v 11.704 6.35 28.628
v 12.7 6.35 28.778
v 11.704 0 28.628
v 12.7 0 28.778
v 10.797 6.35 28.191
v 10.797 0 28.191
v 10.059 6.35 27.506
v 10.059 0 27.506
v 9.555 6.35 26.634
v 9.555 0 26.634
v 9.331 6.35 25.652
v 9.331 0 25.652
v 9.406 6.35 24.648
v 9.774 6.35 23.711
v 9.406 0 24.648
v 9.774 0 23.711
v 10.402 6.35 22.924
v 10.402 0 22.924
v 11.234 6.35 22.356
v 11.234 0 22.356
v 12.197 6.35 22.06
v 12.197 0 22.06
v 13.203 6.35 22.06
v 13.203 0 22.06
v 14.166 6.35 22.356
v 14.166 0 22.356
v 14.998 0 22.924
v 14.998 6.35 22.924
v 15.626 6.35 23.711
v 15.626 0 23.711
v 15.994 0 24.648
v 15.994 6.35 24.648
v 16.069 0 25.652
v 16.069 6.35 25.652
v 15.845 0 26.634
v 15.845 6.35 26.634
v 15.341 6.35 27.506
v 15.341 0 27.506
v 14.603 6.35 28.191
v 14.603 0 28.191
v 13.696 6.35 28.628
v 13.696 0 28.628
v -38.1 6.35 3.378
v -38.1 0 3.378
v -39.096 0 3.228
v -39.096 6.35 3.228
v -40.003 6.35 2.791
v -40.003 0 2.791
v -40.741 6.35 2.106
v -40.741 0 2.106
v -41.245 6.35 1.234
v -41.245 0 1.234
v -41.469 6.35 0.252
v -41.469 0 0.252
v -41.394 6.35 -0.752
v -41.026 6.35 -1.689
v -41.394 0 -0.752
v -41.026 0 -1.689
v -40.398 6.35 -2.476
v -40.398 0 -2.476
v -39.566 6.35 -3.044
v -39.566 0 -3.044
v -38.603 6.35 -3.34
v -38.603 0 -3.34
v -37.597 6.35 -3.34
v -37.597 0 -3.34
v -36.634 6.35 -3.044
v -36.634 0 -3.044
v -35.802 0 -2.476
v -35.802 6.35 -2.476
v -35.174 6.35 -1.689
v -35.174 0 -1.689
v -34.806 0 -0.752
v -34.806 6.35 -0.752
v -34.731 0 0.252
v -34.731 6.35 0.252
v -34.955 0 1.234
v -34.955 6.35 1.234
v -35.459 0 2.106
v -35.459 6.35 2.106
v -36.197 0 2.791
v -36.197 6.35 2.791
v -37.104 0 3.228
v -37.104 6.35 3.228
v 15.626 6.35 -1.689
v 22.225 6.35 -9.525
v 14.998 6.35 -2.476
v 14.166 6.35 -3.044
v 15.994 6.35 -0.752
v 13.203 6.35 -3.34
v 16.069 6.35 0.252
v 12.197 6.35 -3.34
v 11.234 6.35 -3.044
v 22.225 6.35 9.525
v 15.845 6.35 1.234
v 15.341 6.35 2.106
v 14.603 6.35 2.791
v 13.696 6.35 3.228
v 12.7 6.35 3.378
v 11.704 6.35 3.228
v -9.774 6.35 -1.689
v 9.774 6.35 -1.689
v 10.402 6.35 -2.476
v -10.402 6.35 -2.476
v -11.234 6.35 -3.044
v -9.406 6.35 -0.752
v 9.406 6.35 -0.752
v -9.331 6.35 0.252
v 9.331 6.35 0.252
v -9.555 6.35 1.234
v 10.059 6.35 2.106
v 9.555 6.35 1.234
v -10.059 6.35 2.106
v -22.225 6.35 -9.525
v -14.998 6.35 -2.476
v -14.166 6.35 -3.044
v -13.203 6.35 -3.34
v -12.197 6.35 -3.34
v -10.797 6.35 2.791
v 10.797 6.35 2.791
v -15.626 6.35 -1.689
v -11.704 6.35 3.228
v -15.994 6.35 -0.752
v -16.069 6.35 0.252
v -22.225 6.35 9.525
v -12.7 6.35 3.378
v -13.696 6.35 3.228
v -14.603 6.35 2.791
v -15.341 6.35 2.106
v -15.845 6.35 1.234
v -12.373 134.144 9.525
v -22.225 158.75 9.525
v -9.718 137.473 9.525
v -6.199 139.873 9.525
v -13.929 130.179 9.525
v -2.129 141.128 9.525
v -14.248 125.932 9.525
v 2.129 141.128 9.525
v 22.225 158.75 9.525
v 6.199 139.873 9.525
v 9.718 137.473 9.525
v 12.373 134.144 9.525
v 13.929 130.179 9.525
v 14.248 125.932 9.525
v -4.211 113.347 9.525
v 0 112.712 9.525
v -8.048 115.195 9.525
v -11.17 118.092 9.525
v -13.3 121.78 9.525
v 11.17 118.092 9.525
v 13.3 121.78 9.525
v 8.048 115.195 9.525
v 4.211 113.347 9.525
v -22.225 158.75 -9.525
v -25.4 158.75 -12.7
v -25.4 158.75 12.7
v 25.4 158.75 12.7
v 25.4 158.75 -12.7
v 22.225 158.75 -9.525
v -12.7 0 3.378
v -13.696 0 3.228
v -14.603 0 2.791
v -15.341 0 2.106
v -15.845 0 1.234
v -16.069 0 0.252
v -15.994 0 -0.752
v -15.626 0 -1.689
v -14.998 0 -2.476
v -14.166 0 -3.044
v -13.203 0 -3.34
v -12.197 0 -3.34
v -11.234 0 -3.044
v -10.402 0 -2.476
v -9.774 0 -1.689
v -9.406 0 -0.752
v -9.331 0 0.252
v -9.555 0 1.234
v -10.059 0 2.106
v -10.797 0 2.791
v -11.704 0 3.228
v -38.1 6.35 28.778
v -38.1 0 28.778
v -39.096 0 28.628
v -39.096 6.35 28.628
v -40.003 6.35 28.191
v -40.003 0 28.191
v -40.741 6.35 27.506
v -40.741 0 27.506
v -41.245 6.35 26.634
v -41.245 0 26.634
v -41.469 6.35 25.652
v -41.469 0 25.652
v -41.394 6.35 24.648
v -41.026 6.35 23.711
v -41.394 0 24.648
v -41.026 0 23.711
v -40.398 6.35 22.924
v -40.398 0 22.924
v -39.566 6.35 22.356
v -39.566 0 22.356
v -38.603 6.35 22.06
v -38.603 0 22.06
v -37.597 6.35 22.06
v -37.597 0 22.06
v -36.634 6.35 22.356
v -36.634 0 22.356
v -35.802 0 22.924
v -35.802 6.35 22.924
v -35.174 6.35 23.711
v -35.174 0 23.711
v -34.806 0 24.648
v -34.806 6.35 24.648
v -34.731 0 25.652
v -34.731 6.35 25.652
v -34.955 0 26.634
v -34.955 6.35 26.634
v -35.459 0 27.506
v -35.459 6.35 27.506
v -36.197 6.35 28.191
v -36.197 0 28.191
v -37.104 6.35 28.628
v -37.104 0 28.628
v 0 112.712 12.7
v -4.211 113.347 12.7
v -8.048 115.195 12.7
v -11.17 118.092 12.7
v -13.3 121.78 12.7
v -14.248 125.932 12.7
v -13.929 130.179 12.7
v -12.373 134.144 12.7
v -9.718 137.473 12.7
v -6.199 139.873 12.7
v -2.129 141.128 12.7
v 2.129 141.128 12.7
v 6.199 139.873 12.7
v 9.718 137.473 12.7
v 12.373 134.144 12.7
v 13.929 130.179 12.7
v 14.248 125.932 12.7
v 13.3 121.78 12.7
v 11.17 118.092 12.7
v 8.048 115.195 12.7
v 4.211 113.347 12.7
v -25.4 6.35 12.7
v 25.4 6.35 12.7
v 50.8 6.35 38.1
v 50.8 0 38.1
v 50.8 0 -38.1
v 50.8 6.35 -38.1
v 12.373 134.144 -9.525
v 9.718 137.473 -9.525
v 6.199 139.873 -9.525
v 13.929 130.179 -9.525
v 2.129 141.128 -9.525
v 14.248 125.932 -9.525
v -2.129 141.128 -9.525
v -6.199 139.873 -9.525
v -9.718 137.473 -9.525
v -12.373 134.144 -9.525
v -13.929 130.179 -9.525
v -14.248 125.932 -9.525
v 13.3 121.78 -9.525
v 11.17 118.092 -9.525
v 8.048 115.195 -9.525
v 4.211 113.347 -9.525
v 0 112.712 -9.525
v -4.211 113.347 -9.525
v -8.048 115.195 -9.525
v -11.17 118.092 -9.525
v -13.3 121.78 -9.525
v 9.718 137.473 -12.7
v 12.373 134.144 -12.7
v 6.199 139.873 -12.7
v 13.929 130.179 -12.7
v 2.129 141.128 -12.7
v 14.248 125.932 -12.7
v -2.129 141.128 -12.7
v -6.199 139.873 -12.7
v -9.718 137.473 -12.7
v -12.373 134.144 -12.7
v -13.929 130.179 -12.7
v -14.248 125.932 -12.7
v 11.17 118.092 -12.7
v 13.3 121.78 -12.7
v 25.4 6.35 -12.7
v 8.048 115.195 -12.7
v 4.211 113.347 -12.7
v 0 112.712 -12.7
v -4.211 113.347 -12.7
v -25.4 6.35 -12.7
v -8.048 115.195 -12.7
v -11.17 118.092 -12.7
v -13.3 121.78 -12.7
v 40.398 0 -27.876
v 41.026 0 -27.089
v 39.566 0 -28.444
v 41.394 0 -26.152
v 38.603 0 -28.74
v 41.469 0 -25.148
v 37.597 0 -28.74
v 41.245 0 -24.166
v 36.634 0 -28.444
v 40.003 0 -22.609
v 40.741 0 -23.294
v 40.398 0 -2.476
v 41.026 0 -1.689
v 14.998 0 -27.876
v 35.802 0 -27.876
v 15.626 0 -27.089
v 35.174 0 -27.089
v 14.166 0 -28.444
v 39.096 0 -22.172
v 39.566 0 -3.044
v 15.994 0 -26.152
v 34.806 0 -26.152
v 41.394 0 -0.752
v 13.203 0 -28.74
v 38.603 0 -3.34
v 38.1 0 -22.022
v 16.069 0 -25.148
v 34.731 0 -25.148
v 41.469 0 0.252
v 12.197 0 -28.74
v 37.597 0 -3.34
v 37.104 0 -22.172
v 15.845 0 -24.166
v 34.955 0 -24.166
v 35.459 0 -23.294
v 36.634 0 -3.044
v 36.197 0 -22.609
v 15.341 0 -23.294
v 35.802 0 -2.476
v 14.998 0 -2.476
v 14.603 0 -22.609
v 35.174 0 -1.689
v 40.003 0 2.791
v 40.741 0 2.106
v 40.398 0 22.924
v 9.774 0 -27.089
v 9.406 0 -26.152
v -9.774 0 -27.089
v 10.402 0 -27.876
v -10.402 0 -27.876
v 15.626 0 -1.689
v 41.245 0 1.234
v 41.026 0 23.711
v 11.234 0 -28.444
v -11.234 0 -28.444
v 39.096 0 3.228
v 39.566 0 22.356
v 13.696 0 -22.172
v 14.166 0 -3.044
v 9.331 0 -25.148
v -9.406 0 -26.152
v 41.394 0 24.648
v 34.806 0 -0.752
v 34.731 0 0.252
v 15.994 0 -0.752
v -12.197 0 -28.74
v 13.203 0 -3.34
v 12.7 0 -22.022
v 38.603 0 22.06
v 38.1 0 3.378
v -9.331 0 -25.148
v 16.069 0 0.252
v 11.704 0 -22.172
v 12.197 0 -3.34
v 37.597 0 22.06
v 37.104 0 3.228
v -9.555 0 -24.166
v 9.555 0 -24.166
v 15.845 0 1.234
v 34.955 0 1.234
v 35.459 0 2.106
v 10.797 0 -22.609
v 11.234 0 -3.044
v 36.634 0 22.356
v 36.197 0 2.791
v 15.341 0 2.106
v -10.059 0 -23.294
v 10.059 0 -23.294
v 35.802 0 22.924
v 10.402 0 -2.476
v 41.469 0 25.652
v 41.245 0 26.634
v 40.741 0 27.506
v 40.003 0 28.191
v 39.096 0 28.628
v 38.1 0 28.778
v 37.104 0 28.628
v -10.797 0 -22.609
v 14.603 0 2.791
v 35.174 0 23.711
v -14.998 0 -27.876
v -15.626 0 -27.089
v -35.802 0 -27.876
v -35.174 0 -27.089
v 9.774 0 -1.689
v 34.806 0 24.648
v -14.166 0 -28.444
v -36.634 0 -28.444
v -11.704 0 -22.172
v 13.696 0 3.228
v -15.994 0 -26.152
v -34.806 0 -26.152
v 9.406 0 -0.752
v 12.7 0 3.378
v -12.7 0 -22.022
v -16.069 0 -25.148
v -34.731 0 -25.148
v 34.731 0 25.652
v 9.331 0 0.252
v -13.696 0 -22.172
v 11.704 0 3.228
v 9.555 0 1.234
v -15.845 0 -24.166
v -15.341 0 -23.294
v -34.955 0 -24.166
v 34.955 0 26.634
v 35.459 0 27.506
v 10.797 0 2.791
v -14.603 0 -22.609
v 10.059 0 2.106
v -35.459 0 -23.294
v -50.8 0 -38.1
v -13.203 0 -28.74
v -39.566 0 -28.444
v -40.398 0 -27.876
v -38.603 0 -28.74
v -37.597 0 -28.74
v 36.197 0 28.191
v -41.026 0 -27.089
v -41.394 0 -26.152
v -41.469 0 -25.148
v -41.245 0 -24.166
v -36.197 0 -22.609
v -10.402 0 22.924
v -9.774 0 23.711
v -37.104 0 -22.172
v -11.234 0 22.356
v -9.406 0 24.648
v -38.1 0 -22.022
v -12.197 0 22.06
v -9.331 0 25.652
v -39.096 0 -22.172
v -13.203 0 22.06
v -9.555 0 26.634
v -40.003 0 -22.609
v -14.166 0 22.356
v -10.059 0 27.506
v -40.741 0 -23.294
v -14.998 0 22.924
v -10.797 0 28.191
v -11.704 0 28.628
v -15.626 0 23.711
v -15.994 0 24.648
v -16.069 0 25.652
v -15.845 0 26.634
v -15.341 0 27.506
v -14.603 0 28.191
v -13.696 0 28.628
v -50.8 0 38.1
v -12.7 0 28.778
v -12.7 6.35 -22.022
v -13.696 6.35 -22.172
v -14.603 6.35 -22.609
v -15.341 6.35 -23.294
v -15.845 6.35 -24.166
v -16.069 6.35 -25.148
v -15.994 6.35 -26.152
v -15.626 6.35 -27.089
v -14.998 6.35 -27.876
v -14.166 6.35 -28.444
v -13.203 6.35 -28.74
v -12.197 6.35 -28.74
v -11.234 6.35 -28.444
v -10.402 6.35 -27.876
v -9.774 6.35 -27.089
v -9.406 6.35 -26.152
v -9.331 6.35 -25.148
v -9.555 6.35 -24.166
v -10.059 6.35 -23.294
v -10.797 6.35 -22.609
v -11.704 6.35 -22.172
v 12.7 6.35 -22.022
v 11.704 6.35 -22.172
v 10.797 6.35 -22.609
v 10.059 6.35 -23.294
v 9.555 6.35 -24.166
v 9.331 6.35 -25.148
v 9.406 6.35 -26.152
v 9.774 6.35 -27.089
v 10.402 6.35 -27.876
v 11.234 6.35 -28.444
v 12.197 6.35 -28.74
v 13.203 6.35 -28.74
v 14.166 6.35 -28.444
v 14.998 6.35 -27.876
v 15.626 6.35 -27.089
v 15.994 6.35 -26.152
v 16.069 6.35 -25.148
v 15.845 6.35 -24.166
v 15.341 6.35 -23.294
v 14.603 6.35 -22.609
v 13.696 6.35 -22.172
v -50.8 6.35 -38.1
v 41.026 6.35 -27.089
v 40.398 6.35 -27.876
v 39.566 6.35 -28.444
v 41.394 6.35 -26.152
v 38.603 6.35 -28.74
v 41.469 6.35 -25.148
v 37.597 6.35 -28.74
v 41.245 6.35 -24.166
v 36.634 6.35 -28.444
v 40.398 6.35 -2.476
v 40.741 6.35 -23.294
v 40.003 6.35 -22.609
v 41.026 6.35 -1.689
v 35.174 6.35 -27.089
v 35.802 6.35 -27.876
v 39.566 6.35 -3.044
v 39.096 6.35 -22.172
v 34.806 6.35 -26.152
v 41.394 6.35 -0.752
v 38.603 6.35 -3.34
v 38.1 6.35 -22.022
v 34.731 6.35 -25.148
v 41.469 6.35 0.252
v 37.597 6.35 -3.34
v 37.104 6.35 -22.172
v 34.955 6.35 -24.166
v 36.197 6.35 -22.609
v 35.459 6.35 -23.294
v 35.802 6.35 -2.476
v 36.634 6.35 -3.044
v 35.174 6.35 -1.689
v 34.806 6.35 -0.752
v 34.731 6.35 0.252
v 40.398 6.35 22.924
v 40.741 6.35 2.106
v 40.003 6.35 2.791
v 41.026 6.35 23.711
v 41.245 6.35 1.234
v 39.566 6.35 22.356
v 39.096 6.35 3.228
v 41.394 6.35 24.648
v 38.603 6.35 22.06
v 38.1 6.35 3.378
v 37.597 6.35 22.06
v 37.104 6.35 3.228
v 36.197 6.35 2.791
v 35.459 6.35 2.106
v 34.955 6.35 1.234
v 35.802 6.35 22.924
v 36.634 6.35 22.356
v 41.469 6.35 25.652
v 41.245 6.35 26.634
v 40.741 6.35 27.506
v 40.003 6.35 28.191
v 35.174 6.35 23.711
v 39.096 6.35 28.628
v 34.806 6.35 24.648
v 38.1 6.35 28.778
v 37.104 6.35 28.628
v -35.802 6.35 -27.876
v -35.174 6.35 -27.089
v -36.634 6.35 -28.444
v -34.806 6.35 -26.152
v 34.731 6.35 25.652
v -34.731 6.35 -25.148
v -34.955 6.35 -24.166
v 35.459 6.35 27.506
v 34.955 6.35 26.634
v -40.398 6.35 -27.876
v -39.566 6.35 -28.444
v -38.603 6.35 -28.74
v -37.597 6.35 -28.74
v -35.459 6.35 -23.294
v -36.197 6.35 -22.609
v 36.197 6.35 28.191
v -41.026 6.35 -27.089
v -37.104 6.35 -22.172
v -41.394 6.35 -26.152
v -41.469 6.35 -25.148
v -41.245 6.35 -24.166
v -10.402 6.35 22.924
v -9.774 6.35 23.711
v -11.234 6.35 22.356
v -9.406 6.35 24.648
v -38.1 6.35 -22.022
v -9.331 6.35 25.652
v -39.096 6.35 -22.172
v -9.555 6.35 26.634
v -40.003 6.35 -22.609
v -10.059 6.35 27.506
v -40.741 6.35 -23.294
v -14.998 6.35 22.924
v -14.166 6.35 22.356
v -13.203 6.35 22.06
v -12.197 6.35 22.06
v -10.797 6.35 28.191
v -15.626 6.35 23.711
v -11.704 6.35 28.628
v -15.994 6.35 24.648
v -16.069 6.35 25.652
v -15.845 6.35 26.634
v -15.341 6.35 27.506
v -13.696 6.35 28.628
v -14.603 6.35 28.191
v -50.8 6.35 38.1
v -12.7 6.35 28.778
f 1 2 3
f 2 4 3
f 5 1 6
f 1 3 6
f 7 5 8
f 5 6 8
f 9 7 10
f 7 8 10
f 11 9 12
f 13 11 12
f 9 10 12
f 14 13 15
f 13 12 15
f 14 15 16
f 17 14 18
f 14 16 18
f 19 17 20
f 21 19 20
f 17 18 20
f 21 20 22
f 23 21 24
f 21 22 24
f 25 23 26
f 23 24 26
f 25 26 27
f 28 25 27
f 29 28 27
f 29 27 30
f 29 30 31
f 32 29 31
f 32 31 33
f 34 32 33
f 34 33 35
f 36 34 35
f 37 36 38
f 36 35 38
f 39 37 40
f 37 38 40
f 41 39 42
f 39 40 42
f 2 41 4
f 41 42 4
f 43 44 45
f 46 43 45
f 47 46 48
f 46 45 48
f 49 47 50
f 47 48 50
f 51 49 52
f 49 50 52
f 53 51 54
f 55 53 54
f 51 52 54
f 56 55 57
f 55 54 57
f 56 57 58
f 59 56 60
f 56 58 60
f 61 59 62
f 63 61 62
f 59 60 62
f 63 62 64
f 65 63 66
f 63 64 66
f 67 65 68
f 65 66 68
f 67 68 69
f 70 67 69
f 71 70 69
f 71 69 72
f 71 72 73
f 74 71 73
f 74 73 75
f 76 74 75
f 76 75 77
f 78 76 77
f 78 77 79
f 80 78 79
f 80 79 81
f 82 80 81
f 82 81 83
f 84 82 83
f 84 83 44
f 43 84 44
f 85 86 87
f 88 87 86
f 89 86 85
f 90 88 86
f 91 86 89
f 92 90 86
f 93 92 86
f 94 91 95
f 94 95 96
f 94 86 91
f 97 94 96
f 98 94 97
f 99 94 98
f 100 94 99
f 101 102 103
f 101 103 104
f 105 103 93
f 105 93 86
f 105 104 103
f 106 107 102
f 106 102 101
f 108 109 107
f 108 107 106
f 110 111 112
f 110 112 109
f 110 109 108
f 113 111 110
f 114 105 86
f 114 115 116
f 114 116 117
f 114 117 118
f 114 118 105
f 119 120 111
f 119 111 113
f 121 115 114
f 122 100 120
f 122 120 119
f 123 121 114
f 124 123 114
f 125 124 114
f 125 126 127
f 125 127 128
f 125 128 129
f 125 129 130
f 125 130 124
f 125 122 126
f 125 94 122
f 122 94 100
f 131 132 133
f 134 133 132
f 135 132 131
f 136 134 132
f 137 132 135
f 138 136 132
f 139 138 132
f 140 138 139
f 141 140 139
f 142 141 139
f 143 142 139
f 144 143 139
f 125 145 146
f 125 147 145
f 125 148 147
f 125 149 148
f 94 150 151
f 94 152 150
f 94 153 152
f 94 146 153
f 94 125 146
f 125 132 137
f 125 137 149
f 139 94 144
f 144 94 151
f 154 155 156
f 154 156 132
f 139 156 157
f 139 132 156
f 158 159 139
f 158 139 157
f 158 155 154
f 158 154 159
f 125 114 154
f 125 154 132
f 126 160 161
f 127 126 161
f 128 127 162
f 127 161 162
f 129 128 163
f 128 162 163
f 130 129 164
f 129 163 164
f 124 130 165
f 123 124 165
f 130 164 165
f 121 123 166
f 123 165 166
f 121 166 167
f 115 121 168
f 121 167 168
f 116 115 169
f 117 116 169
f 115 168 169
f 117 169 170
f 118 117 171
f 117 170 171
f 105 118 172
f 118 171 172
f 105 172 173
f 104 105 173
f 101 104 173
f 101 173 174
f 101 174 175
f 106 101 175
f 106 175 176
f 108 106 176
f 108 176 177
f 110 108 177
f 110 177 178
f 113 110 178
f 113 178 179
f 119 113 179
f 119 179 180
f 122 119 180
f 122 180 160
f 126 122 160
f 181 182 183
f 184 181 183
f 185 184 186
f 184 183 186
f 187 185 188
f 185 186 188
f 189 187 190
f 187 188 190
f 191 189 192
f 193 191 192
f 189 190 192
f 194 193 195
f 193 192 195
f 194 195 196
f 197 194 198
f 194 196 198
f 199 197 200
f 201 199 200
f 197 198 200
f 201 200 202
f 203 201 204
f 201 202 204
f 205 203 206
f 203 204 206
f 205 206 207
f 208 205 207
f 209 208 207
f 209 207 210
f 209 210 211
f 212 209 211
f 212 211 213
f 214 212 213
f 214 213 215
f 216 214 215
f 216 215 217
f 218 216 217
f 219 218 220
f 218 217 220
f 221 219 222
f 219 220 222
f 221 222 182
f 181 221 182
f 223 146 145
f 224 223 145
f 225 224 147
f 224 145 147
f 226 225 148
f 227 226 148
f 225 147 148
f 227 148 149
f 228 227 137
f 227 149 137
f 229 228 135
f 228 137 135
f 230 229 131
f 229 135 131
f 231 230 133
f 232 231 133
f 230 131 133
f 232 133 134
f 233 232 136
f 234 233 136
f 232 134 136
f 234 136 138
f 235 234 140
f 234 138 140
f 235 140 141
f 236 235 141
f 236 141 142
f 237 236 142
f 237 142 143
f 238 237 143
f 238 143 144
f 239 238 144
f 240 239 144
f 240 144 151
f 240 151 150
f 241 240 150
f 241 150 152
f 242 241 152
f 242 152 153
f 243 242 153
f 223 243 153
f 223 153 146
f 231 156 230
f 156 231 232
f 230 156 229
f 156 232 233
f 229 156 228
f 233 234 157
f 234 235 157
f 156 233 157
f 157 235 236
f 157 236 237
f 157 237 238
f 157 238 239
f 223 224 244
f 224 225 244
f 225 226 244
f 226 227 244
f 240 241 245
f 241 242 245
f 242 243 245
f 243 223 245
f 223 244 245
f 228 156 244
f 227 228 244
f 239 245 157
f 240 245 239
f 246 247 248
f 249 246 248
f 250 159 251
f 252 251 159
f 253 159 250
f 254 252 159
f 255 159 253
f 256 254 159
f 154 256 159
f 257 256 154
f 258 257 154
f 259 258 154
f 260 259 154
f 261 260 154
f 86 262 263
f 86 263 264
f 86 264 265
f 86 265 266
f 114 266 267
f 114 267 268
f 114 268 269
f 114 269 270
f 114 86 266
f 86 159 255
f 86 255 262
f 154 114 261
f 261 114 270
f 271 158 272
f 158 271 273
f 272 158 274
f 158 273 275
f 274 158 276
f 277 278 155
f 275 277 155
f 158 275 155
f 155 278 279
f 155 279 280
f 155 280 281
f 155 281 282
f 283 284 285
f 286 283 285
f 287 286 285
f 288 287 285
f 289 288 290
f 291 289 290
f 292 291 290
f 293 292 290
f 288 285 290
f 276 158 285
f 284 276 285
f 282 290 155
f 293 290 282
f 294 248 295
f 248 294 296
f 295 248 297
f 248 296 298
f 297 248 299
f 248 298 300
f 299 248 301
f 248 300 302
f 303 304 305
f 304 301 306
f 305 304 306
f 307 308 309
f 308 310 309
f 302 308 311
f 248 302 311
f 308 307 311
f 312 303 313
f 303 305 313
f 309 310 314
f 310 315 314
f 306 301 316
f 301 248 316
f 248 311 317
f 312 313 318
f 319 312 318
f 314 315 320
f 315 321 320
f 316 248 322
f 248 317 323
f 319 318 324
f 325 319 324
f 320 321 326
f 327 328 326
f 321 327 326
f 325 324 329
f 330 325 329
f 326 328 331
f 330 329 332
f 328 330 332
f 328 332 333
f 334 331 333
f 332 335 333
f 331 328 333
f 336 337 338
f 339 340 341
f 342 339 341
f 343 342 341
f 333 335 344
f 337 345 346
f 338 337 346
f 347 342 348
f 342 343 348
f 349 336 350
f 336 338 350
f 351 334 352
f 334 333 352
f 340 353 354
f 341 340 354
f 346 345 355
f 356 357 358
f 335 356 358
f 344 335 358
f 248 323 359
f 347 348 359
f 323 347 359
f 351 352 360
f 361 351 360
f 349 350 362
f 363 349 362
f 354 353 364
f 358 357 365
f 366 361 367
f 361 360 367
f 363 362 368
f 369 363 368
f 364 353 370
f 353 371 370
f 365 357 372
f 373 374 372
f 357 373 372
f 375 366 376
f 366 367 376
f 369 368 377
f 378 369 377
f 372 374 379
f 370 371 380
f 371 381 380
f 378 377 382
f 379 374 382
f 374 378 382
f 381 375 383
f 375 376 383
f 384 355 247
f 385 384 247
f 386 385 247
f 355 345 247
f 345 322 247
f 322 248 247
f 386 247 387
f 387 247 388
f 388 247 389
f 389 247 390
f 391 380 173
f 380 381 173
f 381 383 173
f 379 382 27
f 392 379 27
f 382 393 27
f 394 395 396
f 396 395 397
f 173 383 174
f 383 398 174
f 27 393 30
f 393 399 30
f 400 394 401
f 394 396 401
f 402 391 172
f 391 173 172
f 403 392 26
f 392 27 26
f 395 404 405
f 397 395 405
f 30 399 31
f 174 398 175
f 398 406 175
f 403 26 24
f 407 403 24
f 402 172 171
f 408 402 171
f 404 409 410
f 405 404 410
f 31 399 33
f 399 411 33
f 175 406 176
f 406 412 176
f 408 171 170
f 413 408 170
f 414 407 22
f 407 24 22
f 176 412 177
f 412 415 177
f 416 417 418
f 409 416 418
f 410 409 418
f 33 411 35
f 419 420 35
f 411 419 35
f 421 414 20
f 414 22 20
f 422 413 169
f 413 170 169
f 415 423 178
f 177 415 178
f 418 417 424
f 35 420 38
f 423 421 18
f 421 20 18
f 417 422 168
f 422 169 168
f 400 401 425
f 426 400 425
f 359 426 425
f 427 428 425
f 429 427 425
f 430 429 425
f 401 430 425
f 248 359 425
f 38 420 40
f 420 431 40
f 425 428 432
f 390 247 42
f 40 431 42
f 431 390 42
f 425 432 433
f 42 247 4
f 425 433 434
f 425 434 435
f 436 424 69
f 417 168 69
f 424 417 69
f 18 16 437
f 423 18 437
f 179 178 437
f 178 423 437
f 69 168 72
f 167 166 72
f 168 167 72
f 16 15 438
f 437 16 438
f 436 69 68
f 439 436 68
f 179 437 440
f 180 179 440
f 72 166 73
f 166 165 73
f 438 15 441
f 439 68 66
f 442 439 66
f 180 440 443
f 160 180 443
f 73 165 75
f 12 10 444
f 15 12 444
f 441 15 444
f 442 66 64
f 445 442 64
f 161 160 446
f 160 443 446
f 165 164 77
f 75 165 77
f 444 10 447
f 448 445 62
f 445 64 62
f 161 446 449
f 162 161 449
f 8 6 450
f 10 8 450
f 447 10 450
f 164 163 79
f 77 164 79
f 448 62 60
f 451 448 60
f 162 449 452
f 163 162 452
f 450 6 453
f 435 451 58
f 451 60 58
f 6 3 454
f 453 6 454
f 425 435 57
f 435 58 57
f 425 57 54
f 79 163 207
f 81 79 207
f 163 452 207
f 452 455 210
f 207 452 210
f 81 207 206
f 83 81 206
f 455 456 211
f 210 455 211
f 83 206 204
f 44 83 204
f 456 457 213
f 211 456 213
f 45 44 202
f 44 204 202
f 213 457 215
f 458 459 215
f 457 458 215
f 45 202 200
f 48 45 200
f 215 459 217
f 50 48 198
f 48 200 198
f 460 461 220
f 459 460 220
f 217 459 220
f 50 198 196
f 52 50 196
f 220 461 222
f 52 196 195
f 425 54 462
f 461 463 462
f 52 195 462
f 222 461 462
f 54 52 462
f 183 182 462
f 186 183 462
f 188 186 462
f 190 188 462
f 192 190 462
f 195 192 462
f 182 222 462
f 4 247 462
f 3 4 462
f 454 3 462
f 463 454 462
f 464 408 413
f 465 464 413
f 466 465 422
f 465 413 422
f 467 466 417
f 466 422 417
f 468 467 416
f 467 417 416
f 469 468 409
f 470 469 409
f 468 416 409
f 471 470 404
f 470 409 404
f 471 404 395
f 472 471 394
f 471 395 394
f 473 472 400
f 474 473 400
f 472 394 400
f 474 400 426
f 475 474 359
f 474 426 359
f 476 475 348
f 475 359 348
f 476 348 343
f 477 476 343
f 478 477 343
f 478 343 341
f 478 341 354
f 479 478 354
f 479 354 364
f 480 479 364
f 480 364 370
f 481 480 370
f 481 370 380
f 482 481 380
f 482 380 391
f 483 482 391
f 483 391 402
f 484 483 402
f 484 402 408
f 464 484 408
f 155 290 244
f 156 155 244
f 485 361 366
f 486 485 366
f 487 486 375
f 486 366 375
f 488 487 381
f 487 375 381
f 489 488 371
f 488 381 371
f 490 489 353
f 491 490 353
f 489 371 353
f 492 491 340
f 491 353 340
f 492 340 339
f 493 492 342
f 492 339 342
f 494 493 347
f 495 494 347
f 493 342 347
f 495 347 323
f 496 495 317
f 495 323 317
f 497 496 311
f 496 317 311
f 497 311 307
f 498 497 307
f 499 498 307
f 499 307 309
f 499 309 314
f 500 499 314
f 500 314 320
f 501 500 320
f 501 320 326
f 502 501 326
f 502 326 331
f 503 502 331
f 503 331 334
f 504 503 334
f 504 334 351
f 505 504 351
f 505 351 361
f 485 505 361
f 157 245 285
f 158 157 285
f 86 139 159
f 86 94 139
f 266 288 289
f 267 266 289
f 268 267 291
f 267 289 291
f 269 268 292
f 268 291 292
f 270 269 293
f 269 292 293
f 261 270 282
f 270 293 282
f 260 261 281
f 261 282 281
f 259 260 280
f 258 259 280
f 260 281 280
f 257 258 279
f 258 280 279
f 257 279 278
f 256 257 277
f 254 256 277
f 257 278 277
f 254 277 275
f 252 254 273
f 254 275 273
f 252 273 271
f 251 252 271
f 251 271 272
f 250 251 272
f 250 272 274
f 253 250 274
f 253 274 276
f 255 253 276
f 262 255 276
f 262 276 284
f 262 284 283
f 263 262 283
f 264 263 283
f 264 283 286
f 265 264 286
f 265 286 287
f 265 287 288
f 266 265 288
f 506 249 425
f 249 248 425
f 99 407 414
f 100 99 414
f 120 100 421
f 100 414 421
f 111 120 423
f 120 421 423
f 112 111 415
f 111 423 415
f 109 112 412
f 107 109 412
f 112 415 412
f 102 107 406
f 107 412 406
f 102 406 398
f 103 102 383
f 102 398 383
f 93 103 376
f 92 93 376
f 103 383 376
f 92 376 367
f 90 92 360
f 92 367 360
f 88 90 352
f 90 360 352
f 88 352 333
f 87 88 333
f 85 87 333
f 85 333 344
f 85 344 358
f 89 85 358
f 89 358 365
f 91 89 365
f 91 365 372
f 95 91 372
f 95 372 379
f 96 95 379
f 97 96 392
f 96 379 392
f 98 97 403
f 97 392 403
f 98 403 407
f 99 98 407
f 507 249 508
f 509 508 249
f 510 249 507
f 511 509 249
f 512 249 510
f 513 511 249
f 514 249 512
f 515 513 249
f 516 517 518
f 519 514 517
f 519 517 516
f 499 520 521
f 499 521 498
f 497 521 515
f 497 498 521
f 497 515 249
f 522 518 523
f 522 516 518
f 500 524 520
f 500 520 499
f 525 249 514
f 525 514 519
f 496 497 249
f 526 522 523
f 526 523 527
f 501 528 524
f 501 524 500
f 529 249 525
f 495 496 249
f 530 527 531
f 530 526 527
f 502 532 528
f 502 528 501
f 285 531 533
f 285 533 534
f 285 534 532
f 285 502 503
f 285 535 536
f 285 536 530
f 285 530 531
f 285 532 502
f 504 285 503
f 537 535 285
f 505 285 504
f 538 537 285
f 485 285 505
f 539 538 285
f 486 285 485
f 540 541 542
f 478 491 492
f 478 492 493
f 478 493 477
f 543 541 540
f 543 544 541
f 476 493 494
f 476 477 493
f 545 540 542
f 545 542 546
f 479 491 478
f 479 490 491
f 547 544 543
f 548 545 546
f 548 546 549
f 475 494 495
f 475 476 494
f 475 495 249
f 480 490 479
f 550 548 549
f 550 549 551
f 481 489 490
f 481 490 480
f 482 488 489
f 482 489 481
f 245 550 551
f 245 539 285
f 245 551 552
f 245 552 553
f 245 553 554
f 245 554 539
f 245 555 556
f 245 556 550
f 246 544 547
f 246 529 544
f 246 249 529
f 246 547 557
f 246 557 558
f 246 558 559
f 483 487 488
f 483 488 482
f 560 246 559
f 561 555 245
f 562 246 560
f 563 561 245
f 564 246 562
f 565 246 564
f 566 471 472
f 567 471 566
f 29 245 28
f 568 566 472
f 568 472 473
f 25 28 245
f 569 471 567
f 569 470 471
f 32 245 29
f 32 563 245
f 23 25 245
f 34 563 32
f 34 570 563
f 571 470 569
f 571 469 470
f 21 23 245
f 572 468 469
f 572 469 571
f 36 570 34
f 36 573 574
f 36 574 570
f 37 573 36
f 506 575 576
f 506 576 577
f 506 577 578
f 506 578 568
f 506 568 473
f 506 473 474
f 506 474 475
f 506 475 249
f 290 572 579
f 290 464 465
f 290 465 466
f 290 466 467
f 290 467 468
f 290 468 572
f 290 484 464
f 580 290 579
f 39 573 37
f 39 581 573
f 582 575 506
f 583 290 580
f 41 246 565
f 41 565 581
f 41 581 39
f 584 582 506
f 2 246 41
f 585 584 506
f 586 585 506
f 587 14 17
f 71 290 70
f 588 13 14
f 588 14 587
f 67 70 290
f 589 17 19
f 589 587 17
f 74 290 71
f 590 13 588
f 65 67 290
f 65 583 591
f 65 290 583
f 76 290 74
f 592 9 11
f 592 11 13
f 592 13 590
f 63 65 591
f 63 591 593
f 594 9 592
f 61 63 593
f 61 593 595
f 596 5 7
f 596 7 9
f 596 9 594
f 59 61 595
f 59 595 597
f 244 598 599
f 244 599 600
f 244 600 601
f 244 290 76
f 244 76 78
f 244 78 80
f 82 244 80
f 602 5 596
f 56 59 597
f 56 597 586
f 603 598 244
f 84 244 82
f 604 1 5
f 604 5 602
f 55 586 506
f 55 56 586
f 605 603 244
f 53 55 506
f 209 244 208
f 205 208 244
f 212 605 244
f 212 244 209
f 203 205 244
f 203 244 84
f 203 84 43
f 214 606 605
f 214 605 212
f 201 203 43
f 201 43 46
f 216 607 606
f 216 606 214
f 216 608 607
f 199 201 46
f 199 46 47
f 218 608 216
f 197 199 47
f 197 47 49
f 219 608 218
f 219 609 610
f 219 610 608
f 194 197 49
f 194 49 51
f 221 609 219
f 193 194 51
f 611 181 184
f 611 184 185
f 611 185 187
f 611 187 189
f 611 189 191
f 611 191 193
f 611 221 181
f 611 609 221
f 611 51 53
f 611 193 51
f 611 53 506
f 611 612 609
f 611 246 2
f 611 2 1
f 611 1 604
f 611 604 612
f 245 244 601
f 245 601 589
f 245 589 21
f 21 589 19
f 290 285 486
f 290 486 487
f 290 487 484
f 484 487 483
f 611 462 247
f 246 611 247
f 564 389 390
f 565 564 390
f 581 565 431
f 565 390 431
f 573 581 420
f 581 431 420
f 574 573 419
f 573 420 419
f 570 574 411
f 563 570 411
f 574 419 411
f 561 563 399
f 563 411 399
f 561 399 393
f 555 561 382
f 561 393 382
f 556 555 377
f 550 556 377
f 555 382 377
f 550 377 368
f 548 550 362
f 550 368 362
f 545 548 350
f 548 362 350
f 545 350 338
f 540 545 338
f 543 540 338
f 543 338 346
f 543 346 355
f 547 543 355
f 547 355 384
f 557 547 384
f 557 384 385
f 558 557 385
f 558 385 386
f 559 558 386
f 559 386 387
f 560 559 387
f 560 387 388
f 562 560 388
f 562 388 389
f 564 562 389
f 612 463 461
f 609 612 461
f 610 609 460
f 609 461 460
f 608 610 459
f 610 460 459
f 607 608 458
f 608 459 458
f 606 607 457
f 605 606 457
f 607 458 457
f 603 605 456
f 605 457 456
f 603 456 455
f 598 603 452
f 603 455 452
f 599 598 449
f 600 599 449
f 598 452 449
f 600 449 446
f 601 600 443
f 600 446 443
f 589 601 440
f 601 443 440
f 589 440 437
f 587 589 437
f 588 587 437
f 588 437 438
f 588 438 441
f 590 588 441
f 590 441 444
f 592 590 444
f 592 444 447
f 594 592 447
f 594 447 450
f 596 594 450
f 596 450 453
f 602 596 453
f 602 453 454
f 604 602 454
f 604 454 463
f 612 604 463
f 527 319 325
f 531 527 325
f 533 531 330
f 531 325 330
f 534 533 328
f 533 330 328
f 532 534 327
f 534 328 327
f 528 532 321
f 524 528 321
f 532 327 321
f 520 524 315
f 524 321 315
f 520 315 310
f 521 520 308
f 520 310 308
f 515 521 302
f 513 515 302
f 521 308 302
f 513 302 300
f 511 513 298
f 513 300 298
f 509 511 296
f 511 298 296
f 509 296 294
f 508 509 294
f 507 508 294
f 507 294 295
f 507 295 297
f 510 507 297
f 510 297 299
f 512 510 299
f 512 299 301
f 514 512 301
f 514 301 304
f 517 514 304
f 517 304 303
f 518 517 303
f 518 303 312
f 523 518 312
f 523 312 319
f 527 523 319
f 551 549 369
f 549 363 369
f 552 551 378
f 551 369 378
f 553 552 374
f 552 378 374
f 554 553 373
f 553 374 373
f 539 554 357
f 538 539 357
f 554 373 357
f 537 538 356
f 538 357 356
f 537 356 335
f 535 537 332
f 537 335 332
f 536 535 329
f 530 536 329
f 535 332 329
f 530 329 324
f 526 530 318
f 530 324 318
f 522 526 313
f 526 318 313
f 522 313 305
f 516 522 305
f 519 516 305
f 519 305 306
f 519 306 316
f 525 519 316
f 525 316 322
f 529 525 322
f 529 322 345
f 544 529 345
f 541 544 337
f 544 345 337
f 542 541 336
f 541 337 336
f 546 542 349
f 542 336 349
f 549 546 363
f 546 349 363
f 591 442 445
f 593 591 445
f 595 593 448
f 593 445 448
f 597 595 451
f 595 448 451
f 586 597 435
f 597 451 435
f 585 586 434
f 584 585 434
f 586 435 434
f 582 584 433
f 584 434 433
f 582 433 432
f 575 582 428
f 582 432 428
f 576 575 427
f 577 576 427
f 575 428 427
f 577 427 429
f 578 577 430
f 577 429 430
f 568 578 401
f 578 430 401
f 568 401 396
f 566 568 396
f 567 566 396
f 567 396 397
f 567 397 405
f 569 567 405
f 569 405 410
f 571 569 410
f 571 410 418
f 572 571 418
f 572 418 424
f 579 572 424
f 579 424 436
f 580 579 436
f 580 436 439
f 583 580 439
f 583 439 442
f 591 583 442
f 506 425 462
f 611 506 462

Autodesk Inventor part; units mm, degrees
ref_plane "YZ Plane" through (0, 0, 0) normal (1, 0, 0) x (0, 1, 0)
ref_plane "XZ Plane" through (0, 0, 0) normal (0, 1, 0) x (-1, 0, 0)
ref_plane "XY Plane" through (0, 0, 0) normal (0, 0, 1) x (1, 0, 0)
sketch "Sketch1" plane through (0, 0, 0) normal (0, 1, 0) x (-1, 0, 0)
  line L0 (50.8, 38.1) -> (-50.8, 38.1)
  line L1 (-50.8, 38.1) -> (-50.8, -38.1)
  line L2 (-50.8, -38.1) -> (50.8, -38.1)
  line L3 (50.8, -38.1) -> (50.8, 38.1)
  line L4 (50.8, 38.1) -> (-50.8, -38.1) construction
  line L5 (-50.8, 38.1) -> (50.8, -38.1) construction
  point P0 (0, 0)
  dimension "d0" = 76.2
  dimension "d1" = 101.6
extrude "Extrusion1" add sketch "Sketch1" along normal blind 6.35
sketch "Sketch2" plane through (0, 6.35, 0) normal (0, 1, 0) x (1, 0, 0)
  line L0 (25.4, -12.7) -> (25.4, 12.7)
  line L1 (25.4, 12.7) -> (-25.4, 12.7)
  line L2 (-25.4, 12.7) -> (-25.4, -12.7)
  line L3 (-25.4, -12.7) -> (25.4, -12.7)
  line L4 (25.4, -12.7) -> (-25.4, 12.7) construction
  line L5 (25.4, 12.7) -> (-25.4, -12.7) construction
  line L6 (22.225, -9.525) -> (22.225, 9.525)
  line L7 (22.225, 9.525) -> (-22.225, 9.525)
  line L8 (-22.225, 9.525) -> (-22.225, -9.525)
  line L9 (-22.225, -9.525) -> (22.225, -9.525)
  line L10 (22.225, -9.525) -> (-22.225, 9.525) construction
  line L11 (22.225, 9.525) -> (-22.225, -9.525) construction
  point P0 (0, 0)
  dimension "d4" = 50.8
  dimension "d5" = 25.4
  dimension "d6" = 3.175
  dimension "d7" = 3.175
extrude "Extrusion2" add sketch "Sketch2" along normal blind 152.4
sketch "Sketch5" plane through (0, 6.35, 0) normal (0, 1, 0) x (1, 0, 0)
  line L0 (-51.0645, -25.4) -> (50.8, -25.4) construction
  line L1 (50.8, -38.1) -> (50.8, 38.1) construction
  line L2 (-38.1, -38.1) -> (-38.1, 38.1) construction
  line L3 (50.8, 38.1) -> (-50.8, 38.1) construction
  line L4 (-50.8, -38.1) -> (50.8, -38.1) construction
  line L5 (-50.8, 38.1) -> (-50.8, -38.1) construction
  point P0 (0, 0)
  point P1 (-38.1, -25.4)
  point P2 (-12.7, -25.4)
  point P3 (12.7, -25.4)
  point P4 (38.1, -25.4)
  point P5 (-38.1, 0)
  point P6 (-12.7, 0)
  point P7 (12.7, 0)
  point P8 (38.1, 0)
  point P9 (-38.1, 25.4)
  point P10 (-12.7, 25.4)
  point P11 (12.7, 25.4)
  point P12 (38.1, 25.4)
  dimension "d19" = 12.7
  dimension "d20" = 12.7
  dimension "d23" = 25.4
  dimension "d26" = 25.4
hole "Hole2" at (-38.1, 6.35, 25.4) at (-12.7, 6.35, 25.4) at (12.7, 6.35, 25.4) at (38.1, 6.35, 25.4) at (-38.1, 6.35, 0) at (-12.7, 6.35, 0) at (12.7, 6.35, 0) at (38.1, 6.35, 0) at (-38.1, 6.35, -25.4) at (-12.7, 6.35, -25.4) at (12.7, 6.35, -25.4) at (38.1, 6.35, -25.4) direction (0, -1, 0) diameter 6.7564 end through all clearance for "Flat Head Machine Screw (82)" size "1/4" standard "Ansi Unified Screw Threads"
sketch "Sketch6" plane through (-25.4, 6.35, 12.7) normal (0, 0, 1) x (1, 0, 0)
  line L0 (3.175, 0) -> (47.625, 0) construction
  line L1 (25.4, 0) -> (25.4, 152.4) construction
  line L2 (50.8, 152.4) -> (0, 152.4) construction
  line L3 (-1.017, 120.65) -> (50.8, 120.65) construction
  line L4 (50.8, 0) -> (50.8, 152.4) construction
  line L5 (-25.4, -6.35) -> (76.2, -6.35) projected
  point P0 (25.4, -6.35)
  point P1 (25.4, 120.65)
  dimension "d36" = 127
hole "Hole3" at (0, 127, 12.7) direction (0, 0, -1) diameter 28.575 end through all
properties part number "PostForHexAxel"
